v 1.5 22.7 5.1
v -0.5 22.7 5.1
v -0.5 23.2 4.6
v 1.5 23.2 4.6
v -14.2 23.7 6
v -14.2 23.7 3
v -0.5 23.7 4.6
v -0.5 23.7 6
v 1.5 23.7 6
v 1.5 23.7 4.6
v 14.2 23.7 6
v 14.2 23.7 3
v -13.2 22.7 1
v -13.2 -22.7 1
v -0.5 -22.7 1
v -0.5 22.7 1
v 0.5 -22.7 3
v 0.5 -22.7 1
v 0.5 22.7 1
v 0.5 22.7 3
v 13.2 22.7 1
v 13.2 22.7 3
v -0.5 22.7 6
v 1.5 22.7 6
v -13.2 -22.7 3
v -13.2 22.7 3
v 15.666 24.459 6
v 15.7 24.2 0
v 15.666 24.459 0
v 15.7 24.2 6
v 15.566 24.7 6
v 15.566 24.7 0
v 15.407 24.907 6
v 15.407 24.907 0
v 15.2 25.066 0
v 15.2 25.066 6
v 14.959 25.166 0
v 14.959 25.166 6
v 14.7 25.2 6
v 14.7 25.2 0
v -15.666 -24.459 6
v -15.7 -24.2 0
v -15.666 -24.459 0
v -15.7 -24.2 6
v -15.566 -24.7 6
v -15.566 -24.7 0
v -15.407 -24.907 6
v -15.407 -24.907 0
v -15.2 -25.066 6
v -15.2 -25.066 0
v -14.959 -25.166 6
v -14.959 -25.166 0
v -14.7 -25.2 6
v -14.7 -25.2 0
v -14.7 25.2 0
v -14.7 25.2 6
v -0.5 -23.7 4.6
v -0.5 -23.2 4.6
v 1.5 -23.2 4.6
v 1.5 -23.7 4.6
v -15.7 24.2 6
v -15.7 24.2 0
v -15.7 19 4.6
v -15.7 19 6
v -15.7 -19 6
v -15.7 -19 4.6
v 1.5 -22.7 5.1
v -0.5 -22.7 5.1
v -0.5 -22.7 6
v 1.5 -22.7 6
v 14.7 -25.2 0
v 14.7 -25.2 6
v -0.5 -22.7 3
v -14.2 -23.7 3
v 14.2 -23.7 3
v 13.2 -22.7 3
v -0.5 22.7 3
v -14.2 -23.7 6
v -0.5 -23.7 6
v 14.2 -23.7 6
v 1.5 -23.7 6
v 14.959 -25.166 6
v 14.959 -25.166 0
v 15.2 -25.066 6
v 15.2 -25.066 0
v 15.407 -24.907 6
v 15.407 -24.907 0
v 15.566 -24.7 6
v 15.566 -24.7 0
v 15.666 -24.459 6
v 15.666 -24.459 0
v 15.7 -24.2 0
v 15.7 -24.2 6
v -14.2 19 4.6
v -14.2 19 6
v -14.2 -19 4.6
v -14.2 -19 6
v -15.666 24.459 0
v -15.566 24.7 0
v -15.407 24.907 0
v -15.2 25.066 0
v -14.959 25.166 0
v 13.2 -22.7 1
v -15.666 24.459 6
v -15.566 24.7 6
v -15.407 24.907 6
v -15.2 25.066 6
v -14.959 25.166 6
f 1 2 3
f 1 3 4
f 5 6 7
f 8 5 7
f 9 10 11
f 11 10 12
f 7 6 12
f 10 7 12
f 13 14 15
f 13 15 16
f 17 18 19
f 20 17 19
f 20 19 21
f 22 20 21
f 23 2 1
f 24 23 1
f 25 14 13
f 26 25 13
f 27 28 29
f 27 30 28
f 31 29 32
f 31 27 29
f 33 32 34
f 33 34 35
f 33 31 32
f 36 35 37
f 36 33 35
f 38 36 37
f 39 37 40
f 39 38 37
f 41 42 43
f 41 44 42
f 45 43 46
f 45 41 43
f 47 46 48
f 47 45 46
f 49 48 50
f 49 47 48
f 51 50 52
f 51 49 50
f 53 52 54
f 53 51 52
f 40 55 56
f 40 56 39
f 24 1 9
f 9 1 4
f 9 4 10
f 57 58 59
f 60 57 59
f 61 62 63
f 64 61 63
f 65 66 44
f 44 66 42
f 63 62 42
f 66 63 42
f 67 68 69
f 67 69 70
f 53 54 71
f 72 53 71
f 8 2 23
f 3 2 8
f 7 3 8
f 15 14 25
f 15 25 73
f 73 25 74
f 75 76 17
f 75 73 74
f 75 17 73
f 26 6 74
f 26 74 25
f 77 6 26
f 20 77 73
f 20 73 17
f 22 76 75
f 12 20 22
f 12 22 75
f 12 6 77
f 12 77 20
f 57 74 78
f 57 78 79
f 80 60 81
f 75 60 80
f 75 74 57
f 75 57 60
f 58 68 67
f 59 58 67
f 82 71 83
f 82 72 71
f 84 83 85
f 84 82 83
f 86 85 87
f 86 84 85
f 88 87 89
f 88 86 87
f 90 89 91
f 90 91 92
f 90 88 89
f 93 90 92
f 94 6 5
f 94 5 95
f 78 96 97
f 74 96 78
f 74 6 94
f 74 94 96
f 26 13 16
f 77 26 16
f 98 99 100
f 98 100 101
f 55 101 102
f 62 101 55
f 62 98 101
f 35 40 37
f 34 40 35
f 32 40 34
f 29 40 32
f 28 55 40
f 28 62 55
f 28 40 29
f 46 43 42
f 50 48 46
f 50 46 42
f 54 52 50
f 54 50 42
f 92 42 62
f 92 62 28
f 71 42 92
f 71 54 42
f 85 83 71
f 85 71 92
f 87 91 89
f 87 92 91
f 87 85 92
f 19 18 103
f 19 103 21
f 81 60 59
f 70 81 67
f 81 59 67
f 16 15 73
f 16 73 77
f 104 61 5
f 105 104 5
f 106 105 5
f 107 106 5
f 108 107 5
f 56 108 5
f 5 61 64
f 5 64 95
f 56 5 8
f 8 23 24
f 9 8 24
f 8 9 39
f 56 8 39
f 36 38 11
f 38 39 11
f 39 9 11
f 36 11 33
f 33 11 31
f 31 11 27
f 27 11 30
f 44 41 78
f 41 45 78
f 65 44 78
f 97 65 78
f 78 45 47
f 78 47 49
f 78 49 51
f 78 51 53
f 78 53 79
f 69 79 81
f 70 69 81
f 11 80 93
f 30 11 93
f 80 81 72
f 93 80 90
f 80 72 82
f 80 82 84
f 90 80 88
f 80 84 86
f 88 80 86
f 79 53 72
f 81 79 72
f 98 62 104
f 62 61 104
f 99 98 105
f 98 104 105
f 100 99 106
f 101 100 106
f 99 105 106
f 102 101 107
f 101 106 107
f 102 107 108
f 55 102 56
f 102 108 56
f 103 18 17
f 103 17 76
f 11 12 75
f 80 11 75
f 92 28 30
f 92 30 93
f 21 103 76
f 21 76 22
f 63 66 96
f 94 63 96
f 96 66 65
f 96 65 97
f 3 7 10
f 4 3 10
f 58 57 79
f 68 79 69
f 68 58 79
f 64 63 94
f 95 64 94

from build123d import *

# Parameters (mm, degrees)
SKETCH1_W           = 47.4
SKETCH1_H           = 28.4
BOSS_EXTRUDE1_DEPTH = 1
SKETCH2_W           = 31.4
SKETCH2_H           = 50.4
SKETCH2_W_2         = 28.4
SKETCH2_H_2         = 47.4
BOSS_EXTRUDE2_DEPTH = 6
SKETCH3_W           = 28.4
SKETCH3_H           = 47.4
SKETCH3_W_2         = 12.7
SKETCH3_H_2         = 45.4
BOSS_EXTRUDE3_DEPTH = 2
SKETCH4_W           = 2
SKETCH4_H           = 1
BOSS_EXTRUDE4_DEPTH = 1.4
CHAMFER1_SIZE       = 0.5
CUT_EXTRUDE1_START  = -1.4
SKETCH5_W           = 9.609138978
SKETCH5_H           = 38
CUT_EXTRUDE1_DEPTH  = 1.4
FILLET1_R           = 1


with BuildPart() as part:
    # Sketch1 → Boss-Extrude1 (new body)
    with BuildSketch(Plane(origin=(0, 0, 0), x_dir=(0, 1, 0), z_dir=(0, 0, 1))):
        Rectangle(SKETCH1_W, SKETCH1_H)
    extrude(amount=BOSS_EXTRUDE1_DEPTH)



with BuildPart() as body_2:
    # Sketch2 → Boss-Extrude2 (new body)
    with BuildSketch(Plane(origin=(0, 0, 0), x_dir=(1, 0, 0), z_dir=(0, 0, -1))):
        Rectangle(SKETCH2_W, SKETCH2_H)
        Rectangle(SKETCH2_W_2, SKETCH2_H_2, mode=Mode.SUBTRACT)
    extrude(amount=-BOSS_EXTRUDE2_DEPTH)


with BuildPart() as part_1:
    add(part.part)

    add(body_2.part)  # Boss-Extrude3 merges body 2
    # Sketch3 → Boss-Extrude3 (add)
    with BuildSketch(Plane.XY.offset(1)):
        Rectangle(SKETCH3_W, SKETCH3_H)
        with Locations((-6.85, 0)):
            Rectangle(SKETCH3_W_2, SKETCH3_H_2, mode=Mode.SUBTRACT)
        with Locations((6.85, 0)):
            Rectangle(SKETCH3_W_2, SKETCH3_H_2, mode=Mode.SUBTRACT)
    extrude(amount=BOSS_EXTRUDE3_DEPTH)

    # Sketch4 → Boss-Extrude4 (add)
    with BuildSketch(Plane.XY.offset(4.6)):
        with Locations((0.5, 23.2)):
            Rectangle(SKETCH4_W, SKETCH4_H)
        with Locations((0.5, -23.2)):
            Rectangle(SKETCH4_W, SKETCH4_H)
    extrude(amount=BOSS_EXTRUDE4_DEPTH)

    # Chamfer1
    chamfer1_edges = [part_1.edges().sort_by_distance(p)[0] for p in [
        (0.5, 22.7, 4.6),
        (0.5, -22.7, 4.6),
    ]]
    chamfer(chamfer1_edges, length=CHAMFER1_SIZE)

    # Sketch5 → Cut-Extrude1 (cut)
    with BuildSketch(Plane.XY.offset(6).offset(CUT_EXTRUDE1_START)):
        with Locations((-14.2, 0)):
            Rectangle(SKETCH5_W, SKETCH5_H)
    extrude(amount=CUT_EXTRUDE1_DEPTH, mode=Mode.SUBTRACT)

    # Fillet1
    fillet1_edges = [part_1.edges().sort_by_distance(p)[0] for p in [
        (-15.7, -25.2, 3),
        (15.7, -25.2, 3),
        (15.7, 25.2, 3),
        (-15.7, 25.2, 3),
    ]]
    fillet(fillet1_edges, radius=FILLET1_R)


solid = part_1.part
